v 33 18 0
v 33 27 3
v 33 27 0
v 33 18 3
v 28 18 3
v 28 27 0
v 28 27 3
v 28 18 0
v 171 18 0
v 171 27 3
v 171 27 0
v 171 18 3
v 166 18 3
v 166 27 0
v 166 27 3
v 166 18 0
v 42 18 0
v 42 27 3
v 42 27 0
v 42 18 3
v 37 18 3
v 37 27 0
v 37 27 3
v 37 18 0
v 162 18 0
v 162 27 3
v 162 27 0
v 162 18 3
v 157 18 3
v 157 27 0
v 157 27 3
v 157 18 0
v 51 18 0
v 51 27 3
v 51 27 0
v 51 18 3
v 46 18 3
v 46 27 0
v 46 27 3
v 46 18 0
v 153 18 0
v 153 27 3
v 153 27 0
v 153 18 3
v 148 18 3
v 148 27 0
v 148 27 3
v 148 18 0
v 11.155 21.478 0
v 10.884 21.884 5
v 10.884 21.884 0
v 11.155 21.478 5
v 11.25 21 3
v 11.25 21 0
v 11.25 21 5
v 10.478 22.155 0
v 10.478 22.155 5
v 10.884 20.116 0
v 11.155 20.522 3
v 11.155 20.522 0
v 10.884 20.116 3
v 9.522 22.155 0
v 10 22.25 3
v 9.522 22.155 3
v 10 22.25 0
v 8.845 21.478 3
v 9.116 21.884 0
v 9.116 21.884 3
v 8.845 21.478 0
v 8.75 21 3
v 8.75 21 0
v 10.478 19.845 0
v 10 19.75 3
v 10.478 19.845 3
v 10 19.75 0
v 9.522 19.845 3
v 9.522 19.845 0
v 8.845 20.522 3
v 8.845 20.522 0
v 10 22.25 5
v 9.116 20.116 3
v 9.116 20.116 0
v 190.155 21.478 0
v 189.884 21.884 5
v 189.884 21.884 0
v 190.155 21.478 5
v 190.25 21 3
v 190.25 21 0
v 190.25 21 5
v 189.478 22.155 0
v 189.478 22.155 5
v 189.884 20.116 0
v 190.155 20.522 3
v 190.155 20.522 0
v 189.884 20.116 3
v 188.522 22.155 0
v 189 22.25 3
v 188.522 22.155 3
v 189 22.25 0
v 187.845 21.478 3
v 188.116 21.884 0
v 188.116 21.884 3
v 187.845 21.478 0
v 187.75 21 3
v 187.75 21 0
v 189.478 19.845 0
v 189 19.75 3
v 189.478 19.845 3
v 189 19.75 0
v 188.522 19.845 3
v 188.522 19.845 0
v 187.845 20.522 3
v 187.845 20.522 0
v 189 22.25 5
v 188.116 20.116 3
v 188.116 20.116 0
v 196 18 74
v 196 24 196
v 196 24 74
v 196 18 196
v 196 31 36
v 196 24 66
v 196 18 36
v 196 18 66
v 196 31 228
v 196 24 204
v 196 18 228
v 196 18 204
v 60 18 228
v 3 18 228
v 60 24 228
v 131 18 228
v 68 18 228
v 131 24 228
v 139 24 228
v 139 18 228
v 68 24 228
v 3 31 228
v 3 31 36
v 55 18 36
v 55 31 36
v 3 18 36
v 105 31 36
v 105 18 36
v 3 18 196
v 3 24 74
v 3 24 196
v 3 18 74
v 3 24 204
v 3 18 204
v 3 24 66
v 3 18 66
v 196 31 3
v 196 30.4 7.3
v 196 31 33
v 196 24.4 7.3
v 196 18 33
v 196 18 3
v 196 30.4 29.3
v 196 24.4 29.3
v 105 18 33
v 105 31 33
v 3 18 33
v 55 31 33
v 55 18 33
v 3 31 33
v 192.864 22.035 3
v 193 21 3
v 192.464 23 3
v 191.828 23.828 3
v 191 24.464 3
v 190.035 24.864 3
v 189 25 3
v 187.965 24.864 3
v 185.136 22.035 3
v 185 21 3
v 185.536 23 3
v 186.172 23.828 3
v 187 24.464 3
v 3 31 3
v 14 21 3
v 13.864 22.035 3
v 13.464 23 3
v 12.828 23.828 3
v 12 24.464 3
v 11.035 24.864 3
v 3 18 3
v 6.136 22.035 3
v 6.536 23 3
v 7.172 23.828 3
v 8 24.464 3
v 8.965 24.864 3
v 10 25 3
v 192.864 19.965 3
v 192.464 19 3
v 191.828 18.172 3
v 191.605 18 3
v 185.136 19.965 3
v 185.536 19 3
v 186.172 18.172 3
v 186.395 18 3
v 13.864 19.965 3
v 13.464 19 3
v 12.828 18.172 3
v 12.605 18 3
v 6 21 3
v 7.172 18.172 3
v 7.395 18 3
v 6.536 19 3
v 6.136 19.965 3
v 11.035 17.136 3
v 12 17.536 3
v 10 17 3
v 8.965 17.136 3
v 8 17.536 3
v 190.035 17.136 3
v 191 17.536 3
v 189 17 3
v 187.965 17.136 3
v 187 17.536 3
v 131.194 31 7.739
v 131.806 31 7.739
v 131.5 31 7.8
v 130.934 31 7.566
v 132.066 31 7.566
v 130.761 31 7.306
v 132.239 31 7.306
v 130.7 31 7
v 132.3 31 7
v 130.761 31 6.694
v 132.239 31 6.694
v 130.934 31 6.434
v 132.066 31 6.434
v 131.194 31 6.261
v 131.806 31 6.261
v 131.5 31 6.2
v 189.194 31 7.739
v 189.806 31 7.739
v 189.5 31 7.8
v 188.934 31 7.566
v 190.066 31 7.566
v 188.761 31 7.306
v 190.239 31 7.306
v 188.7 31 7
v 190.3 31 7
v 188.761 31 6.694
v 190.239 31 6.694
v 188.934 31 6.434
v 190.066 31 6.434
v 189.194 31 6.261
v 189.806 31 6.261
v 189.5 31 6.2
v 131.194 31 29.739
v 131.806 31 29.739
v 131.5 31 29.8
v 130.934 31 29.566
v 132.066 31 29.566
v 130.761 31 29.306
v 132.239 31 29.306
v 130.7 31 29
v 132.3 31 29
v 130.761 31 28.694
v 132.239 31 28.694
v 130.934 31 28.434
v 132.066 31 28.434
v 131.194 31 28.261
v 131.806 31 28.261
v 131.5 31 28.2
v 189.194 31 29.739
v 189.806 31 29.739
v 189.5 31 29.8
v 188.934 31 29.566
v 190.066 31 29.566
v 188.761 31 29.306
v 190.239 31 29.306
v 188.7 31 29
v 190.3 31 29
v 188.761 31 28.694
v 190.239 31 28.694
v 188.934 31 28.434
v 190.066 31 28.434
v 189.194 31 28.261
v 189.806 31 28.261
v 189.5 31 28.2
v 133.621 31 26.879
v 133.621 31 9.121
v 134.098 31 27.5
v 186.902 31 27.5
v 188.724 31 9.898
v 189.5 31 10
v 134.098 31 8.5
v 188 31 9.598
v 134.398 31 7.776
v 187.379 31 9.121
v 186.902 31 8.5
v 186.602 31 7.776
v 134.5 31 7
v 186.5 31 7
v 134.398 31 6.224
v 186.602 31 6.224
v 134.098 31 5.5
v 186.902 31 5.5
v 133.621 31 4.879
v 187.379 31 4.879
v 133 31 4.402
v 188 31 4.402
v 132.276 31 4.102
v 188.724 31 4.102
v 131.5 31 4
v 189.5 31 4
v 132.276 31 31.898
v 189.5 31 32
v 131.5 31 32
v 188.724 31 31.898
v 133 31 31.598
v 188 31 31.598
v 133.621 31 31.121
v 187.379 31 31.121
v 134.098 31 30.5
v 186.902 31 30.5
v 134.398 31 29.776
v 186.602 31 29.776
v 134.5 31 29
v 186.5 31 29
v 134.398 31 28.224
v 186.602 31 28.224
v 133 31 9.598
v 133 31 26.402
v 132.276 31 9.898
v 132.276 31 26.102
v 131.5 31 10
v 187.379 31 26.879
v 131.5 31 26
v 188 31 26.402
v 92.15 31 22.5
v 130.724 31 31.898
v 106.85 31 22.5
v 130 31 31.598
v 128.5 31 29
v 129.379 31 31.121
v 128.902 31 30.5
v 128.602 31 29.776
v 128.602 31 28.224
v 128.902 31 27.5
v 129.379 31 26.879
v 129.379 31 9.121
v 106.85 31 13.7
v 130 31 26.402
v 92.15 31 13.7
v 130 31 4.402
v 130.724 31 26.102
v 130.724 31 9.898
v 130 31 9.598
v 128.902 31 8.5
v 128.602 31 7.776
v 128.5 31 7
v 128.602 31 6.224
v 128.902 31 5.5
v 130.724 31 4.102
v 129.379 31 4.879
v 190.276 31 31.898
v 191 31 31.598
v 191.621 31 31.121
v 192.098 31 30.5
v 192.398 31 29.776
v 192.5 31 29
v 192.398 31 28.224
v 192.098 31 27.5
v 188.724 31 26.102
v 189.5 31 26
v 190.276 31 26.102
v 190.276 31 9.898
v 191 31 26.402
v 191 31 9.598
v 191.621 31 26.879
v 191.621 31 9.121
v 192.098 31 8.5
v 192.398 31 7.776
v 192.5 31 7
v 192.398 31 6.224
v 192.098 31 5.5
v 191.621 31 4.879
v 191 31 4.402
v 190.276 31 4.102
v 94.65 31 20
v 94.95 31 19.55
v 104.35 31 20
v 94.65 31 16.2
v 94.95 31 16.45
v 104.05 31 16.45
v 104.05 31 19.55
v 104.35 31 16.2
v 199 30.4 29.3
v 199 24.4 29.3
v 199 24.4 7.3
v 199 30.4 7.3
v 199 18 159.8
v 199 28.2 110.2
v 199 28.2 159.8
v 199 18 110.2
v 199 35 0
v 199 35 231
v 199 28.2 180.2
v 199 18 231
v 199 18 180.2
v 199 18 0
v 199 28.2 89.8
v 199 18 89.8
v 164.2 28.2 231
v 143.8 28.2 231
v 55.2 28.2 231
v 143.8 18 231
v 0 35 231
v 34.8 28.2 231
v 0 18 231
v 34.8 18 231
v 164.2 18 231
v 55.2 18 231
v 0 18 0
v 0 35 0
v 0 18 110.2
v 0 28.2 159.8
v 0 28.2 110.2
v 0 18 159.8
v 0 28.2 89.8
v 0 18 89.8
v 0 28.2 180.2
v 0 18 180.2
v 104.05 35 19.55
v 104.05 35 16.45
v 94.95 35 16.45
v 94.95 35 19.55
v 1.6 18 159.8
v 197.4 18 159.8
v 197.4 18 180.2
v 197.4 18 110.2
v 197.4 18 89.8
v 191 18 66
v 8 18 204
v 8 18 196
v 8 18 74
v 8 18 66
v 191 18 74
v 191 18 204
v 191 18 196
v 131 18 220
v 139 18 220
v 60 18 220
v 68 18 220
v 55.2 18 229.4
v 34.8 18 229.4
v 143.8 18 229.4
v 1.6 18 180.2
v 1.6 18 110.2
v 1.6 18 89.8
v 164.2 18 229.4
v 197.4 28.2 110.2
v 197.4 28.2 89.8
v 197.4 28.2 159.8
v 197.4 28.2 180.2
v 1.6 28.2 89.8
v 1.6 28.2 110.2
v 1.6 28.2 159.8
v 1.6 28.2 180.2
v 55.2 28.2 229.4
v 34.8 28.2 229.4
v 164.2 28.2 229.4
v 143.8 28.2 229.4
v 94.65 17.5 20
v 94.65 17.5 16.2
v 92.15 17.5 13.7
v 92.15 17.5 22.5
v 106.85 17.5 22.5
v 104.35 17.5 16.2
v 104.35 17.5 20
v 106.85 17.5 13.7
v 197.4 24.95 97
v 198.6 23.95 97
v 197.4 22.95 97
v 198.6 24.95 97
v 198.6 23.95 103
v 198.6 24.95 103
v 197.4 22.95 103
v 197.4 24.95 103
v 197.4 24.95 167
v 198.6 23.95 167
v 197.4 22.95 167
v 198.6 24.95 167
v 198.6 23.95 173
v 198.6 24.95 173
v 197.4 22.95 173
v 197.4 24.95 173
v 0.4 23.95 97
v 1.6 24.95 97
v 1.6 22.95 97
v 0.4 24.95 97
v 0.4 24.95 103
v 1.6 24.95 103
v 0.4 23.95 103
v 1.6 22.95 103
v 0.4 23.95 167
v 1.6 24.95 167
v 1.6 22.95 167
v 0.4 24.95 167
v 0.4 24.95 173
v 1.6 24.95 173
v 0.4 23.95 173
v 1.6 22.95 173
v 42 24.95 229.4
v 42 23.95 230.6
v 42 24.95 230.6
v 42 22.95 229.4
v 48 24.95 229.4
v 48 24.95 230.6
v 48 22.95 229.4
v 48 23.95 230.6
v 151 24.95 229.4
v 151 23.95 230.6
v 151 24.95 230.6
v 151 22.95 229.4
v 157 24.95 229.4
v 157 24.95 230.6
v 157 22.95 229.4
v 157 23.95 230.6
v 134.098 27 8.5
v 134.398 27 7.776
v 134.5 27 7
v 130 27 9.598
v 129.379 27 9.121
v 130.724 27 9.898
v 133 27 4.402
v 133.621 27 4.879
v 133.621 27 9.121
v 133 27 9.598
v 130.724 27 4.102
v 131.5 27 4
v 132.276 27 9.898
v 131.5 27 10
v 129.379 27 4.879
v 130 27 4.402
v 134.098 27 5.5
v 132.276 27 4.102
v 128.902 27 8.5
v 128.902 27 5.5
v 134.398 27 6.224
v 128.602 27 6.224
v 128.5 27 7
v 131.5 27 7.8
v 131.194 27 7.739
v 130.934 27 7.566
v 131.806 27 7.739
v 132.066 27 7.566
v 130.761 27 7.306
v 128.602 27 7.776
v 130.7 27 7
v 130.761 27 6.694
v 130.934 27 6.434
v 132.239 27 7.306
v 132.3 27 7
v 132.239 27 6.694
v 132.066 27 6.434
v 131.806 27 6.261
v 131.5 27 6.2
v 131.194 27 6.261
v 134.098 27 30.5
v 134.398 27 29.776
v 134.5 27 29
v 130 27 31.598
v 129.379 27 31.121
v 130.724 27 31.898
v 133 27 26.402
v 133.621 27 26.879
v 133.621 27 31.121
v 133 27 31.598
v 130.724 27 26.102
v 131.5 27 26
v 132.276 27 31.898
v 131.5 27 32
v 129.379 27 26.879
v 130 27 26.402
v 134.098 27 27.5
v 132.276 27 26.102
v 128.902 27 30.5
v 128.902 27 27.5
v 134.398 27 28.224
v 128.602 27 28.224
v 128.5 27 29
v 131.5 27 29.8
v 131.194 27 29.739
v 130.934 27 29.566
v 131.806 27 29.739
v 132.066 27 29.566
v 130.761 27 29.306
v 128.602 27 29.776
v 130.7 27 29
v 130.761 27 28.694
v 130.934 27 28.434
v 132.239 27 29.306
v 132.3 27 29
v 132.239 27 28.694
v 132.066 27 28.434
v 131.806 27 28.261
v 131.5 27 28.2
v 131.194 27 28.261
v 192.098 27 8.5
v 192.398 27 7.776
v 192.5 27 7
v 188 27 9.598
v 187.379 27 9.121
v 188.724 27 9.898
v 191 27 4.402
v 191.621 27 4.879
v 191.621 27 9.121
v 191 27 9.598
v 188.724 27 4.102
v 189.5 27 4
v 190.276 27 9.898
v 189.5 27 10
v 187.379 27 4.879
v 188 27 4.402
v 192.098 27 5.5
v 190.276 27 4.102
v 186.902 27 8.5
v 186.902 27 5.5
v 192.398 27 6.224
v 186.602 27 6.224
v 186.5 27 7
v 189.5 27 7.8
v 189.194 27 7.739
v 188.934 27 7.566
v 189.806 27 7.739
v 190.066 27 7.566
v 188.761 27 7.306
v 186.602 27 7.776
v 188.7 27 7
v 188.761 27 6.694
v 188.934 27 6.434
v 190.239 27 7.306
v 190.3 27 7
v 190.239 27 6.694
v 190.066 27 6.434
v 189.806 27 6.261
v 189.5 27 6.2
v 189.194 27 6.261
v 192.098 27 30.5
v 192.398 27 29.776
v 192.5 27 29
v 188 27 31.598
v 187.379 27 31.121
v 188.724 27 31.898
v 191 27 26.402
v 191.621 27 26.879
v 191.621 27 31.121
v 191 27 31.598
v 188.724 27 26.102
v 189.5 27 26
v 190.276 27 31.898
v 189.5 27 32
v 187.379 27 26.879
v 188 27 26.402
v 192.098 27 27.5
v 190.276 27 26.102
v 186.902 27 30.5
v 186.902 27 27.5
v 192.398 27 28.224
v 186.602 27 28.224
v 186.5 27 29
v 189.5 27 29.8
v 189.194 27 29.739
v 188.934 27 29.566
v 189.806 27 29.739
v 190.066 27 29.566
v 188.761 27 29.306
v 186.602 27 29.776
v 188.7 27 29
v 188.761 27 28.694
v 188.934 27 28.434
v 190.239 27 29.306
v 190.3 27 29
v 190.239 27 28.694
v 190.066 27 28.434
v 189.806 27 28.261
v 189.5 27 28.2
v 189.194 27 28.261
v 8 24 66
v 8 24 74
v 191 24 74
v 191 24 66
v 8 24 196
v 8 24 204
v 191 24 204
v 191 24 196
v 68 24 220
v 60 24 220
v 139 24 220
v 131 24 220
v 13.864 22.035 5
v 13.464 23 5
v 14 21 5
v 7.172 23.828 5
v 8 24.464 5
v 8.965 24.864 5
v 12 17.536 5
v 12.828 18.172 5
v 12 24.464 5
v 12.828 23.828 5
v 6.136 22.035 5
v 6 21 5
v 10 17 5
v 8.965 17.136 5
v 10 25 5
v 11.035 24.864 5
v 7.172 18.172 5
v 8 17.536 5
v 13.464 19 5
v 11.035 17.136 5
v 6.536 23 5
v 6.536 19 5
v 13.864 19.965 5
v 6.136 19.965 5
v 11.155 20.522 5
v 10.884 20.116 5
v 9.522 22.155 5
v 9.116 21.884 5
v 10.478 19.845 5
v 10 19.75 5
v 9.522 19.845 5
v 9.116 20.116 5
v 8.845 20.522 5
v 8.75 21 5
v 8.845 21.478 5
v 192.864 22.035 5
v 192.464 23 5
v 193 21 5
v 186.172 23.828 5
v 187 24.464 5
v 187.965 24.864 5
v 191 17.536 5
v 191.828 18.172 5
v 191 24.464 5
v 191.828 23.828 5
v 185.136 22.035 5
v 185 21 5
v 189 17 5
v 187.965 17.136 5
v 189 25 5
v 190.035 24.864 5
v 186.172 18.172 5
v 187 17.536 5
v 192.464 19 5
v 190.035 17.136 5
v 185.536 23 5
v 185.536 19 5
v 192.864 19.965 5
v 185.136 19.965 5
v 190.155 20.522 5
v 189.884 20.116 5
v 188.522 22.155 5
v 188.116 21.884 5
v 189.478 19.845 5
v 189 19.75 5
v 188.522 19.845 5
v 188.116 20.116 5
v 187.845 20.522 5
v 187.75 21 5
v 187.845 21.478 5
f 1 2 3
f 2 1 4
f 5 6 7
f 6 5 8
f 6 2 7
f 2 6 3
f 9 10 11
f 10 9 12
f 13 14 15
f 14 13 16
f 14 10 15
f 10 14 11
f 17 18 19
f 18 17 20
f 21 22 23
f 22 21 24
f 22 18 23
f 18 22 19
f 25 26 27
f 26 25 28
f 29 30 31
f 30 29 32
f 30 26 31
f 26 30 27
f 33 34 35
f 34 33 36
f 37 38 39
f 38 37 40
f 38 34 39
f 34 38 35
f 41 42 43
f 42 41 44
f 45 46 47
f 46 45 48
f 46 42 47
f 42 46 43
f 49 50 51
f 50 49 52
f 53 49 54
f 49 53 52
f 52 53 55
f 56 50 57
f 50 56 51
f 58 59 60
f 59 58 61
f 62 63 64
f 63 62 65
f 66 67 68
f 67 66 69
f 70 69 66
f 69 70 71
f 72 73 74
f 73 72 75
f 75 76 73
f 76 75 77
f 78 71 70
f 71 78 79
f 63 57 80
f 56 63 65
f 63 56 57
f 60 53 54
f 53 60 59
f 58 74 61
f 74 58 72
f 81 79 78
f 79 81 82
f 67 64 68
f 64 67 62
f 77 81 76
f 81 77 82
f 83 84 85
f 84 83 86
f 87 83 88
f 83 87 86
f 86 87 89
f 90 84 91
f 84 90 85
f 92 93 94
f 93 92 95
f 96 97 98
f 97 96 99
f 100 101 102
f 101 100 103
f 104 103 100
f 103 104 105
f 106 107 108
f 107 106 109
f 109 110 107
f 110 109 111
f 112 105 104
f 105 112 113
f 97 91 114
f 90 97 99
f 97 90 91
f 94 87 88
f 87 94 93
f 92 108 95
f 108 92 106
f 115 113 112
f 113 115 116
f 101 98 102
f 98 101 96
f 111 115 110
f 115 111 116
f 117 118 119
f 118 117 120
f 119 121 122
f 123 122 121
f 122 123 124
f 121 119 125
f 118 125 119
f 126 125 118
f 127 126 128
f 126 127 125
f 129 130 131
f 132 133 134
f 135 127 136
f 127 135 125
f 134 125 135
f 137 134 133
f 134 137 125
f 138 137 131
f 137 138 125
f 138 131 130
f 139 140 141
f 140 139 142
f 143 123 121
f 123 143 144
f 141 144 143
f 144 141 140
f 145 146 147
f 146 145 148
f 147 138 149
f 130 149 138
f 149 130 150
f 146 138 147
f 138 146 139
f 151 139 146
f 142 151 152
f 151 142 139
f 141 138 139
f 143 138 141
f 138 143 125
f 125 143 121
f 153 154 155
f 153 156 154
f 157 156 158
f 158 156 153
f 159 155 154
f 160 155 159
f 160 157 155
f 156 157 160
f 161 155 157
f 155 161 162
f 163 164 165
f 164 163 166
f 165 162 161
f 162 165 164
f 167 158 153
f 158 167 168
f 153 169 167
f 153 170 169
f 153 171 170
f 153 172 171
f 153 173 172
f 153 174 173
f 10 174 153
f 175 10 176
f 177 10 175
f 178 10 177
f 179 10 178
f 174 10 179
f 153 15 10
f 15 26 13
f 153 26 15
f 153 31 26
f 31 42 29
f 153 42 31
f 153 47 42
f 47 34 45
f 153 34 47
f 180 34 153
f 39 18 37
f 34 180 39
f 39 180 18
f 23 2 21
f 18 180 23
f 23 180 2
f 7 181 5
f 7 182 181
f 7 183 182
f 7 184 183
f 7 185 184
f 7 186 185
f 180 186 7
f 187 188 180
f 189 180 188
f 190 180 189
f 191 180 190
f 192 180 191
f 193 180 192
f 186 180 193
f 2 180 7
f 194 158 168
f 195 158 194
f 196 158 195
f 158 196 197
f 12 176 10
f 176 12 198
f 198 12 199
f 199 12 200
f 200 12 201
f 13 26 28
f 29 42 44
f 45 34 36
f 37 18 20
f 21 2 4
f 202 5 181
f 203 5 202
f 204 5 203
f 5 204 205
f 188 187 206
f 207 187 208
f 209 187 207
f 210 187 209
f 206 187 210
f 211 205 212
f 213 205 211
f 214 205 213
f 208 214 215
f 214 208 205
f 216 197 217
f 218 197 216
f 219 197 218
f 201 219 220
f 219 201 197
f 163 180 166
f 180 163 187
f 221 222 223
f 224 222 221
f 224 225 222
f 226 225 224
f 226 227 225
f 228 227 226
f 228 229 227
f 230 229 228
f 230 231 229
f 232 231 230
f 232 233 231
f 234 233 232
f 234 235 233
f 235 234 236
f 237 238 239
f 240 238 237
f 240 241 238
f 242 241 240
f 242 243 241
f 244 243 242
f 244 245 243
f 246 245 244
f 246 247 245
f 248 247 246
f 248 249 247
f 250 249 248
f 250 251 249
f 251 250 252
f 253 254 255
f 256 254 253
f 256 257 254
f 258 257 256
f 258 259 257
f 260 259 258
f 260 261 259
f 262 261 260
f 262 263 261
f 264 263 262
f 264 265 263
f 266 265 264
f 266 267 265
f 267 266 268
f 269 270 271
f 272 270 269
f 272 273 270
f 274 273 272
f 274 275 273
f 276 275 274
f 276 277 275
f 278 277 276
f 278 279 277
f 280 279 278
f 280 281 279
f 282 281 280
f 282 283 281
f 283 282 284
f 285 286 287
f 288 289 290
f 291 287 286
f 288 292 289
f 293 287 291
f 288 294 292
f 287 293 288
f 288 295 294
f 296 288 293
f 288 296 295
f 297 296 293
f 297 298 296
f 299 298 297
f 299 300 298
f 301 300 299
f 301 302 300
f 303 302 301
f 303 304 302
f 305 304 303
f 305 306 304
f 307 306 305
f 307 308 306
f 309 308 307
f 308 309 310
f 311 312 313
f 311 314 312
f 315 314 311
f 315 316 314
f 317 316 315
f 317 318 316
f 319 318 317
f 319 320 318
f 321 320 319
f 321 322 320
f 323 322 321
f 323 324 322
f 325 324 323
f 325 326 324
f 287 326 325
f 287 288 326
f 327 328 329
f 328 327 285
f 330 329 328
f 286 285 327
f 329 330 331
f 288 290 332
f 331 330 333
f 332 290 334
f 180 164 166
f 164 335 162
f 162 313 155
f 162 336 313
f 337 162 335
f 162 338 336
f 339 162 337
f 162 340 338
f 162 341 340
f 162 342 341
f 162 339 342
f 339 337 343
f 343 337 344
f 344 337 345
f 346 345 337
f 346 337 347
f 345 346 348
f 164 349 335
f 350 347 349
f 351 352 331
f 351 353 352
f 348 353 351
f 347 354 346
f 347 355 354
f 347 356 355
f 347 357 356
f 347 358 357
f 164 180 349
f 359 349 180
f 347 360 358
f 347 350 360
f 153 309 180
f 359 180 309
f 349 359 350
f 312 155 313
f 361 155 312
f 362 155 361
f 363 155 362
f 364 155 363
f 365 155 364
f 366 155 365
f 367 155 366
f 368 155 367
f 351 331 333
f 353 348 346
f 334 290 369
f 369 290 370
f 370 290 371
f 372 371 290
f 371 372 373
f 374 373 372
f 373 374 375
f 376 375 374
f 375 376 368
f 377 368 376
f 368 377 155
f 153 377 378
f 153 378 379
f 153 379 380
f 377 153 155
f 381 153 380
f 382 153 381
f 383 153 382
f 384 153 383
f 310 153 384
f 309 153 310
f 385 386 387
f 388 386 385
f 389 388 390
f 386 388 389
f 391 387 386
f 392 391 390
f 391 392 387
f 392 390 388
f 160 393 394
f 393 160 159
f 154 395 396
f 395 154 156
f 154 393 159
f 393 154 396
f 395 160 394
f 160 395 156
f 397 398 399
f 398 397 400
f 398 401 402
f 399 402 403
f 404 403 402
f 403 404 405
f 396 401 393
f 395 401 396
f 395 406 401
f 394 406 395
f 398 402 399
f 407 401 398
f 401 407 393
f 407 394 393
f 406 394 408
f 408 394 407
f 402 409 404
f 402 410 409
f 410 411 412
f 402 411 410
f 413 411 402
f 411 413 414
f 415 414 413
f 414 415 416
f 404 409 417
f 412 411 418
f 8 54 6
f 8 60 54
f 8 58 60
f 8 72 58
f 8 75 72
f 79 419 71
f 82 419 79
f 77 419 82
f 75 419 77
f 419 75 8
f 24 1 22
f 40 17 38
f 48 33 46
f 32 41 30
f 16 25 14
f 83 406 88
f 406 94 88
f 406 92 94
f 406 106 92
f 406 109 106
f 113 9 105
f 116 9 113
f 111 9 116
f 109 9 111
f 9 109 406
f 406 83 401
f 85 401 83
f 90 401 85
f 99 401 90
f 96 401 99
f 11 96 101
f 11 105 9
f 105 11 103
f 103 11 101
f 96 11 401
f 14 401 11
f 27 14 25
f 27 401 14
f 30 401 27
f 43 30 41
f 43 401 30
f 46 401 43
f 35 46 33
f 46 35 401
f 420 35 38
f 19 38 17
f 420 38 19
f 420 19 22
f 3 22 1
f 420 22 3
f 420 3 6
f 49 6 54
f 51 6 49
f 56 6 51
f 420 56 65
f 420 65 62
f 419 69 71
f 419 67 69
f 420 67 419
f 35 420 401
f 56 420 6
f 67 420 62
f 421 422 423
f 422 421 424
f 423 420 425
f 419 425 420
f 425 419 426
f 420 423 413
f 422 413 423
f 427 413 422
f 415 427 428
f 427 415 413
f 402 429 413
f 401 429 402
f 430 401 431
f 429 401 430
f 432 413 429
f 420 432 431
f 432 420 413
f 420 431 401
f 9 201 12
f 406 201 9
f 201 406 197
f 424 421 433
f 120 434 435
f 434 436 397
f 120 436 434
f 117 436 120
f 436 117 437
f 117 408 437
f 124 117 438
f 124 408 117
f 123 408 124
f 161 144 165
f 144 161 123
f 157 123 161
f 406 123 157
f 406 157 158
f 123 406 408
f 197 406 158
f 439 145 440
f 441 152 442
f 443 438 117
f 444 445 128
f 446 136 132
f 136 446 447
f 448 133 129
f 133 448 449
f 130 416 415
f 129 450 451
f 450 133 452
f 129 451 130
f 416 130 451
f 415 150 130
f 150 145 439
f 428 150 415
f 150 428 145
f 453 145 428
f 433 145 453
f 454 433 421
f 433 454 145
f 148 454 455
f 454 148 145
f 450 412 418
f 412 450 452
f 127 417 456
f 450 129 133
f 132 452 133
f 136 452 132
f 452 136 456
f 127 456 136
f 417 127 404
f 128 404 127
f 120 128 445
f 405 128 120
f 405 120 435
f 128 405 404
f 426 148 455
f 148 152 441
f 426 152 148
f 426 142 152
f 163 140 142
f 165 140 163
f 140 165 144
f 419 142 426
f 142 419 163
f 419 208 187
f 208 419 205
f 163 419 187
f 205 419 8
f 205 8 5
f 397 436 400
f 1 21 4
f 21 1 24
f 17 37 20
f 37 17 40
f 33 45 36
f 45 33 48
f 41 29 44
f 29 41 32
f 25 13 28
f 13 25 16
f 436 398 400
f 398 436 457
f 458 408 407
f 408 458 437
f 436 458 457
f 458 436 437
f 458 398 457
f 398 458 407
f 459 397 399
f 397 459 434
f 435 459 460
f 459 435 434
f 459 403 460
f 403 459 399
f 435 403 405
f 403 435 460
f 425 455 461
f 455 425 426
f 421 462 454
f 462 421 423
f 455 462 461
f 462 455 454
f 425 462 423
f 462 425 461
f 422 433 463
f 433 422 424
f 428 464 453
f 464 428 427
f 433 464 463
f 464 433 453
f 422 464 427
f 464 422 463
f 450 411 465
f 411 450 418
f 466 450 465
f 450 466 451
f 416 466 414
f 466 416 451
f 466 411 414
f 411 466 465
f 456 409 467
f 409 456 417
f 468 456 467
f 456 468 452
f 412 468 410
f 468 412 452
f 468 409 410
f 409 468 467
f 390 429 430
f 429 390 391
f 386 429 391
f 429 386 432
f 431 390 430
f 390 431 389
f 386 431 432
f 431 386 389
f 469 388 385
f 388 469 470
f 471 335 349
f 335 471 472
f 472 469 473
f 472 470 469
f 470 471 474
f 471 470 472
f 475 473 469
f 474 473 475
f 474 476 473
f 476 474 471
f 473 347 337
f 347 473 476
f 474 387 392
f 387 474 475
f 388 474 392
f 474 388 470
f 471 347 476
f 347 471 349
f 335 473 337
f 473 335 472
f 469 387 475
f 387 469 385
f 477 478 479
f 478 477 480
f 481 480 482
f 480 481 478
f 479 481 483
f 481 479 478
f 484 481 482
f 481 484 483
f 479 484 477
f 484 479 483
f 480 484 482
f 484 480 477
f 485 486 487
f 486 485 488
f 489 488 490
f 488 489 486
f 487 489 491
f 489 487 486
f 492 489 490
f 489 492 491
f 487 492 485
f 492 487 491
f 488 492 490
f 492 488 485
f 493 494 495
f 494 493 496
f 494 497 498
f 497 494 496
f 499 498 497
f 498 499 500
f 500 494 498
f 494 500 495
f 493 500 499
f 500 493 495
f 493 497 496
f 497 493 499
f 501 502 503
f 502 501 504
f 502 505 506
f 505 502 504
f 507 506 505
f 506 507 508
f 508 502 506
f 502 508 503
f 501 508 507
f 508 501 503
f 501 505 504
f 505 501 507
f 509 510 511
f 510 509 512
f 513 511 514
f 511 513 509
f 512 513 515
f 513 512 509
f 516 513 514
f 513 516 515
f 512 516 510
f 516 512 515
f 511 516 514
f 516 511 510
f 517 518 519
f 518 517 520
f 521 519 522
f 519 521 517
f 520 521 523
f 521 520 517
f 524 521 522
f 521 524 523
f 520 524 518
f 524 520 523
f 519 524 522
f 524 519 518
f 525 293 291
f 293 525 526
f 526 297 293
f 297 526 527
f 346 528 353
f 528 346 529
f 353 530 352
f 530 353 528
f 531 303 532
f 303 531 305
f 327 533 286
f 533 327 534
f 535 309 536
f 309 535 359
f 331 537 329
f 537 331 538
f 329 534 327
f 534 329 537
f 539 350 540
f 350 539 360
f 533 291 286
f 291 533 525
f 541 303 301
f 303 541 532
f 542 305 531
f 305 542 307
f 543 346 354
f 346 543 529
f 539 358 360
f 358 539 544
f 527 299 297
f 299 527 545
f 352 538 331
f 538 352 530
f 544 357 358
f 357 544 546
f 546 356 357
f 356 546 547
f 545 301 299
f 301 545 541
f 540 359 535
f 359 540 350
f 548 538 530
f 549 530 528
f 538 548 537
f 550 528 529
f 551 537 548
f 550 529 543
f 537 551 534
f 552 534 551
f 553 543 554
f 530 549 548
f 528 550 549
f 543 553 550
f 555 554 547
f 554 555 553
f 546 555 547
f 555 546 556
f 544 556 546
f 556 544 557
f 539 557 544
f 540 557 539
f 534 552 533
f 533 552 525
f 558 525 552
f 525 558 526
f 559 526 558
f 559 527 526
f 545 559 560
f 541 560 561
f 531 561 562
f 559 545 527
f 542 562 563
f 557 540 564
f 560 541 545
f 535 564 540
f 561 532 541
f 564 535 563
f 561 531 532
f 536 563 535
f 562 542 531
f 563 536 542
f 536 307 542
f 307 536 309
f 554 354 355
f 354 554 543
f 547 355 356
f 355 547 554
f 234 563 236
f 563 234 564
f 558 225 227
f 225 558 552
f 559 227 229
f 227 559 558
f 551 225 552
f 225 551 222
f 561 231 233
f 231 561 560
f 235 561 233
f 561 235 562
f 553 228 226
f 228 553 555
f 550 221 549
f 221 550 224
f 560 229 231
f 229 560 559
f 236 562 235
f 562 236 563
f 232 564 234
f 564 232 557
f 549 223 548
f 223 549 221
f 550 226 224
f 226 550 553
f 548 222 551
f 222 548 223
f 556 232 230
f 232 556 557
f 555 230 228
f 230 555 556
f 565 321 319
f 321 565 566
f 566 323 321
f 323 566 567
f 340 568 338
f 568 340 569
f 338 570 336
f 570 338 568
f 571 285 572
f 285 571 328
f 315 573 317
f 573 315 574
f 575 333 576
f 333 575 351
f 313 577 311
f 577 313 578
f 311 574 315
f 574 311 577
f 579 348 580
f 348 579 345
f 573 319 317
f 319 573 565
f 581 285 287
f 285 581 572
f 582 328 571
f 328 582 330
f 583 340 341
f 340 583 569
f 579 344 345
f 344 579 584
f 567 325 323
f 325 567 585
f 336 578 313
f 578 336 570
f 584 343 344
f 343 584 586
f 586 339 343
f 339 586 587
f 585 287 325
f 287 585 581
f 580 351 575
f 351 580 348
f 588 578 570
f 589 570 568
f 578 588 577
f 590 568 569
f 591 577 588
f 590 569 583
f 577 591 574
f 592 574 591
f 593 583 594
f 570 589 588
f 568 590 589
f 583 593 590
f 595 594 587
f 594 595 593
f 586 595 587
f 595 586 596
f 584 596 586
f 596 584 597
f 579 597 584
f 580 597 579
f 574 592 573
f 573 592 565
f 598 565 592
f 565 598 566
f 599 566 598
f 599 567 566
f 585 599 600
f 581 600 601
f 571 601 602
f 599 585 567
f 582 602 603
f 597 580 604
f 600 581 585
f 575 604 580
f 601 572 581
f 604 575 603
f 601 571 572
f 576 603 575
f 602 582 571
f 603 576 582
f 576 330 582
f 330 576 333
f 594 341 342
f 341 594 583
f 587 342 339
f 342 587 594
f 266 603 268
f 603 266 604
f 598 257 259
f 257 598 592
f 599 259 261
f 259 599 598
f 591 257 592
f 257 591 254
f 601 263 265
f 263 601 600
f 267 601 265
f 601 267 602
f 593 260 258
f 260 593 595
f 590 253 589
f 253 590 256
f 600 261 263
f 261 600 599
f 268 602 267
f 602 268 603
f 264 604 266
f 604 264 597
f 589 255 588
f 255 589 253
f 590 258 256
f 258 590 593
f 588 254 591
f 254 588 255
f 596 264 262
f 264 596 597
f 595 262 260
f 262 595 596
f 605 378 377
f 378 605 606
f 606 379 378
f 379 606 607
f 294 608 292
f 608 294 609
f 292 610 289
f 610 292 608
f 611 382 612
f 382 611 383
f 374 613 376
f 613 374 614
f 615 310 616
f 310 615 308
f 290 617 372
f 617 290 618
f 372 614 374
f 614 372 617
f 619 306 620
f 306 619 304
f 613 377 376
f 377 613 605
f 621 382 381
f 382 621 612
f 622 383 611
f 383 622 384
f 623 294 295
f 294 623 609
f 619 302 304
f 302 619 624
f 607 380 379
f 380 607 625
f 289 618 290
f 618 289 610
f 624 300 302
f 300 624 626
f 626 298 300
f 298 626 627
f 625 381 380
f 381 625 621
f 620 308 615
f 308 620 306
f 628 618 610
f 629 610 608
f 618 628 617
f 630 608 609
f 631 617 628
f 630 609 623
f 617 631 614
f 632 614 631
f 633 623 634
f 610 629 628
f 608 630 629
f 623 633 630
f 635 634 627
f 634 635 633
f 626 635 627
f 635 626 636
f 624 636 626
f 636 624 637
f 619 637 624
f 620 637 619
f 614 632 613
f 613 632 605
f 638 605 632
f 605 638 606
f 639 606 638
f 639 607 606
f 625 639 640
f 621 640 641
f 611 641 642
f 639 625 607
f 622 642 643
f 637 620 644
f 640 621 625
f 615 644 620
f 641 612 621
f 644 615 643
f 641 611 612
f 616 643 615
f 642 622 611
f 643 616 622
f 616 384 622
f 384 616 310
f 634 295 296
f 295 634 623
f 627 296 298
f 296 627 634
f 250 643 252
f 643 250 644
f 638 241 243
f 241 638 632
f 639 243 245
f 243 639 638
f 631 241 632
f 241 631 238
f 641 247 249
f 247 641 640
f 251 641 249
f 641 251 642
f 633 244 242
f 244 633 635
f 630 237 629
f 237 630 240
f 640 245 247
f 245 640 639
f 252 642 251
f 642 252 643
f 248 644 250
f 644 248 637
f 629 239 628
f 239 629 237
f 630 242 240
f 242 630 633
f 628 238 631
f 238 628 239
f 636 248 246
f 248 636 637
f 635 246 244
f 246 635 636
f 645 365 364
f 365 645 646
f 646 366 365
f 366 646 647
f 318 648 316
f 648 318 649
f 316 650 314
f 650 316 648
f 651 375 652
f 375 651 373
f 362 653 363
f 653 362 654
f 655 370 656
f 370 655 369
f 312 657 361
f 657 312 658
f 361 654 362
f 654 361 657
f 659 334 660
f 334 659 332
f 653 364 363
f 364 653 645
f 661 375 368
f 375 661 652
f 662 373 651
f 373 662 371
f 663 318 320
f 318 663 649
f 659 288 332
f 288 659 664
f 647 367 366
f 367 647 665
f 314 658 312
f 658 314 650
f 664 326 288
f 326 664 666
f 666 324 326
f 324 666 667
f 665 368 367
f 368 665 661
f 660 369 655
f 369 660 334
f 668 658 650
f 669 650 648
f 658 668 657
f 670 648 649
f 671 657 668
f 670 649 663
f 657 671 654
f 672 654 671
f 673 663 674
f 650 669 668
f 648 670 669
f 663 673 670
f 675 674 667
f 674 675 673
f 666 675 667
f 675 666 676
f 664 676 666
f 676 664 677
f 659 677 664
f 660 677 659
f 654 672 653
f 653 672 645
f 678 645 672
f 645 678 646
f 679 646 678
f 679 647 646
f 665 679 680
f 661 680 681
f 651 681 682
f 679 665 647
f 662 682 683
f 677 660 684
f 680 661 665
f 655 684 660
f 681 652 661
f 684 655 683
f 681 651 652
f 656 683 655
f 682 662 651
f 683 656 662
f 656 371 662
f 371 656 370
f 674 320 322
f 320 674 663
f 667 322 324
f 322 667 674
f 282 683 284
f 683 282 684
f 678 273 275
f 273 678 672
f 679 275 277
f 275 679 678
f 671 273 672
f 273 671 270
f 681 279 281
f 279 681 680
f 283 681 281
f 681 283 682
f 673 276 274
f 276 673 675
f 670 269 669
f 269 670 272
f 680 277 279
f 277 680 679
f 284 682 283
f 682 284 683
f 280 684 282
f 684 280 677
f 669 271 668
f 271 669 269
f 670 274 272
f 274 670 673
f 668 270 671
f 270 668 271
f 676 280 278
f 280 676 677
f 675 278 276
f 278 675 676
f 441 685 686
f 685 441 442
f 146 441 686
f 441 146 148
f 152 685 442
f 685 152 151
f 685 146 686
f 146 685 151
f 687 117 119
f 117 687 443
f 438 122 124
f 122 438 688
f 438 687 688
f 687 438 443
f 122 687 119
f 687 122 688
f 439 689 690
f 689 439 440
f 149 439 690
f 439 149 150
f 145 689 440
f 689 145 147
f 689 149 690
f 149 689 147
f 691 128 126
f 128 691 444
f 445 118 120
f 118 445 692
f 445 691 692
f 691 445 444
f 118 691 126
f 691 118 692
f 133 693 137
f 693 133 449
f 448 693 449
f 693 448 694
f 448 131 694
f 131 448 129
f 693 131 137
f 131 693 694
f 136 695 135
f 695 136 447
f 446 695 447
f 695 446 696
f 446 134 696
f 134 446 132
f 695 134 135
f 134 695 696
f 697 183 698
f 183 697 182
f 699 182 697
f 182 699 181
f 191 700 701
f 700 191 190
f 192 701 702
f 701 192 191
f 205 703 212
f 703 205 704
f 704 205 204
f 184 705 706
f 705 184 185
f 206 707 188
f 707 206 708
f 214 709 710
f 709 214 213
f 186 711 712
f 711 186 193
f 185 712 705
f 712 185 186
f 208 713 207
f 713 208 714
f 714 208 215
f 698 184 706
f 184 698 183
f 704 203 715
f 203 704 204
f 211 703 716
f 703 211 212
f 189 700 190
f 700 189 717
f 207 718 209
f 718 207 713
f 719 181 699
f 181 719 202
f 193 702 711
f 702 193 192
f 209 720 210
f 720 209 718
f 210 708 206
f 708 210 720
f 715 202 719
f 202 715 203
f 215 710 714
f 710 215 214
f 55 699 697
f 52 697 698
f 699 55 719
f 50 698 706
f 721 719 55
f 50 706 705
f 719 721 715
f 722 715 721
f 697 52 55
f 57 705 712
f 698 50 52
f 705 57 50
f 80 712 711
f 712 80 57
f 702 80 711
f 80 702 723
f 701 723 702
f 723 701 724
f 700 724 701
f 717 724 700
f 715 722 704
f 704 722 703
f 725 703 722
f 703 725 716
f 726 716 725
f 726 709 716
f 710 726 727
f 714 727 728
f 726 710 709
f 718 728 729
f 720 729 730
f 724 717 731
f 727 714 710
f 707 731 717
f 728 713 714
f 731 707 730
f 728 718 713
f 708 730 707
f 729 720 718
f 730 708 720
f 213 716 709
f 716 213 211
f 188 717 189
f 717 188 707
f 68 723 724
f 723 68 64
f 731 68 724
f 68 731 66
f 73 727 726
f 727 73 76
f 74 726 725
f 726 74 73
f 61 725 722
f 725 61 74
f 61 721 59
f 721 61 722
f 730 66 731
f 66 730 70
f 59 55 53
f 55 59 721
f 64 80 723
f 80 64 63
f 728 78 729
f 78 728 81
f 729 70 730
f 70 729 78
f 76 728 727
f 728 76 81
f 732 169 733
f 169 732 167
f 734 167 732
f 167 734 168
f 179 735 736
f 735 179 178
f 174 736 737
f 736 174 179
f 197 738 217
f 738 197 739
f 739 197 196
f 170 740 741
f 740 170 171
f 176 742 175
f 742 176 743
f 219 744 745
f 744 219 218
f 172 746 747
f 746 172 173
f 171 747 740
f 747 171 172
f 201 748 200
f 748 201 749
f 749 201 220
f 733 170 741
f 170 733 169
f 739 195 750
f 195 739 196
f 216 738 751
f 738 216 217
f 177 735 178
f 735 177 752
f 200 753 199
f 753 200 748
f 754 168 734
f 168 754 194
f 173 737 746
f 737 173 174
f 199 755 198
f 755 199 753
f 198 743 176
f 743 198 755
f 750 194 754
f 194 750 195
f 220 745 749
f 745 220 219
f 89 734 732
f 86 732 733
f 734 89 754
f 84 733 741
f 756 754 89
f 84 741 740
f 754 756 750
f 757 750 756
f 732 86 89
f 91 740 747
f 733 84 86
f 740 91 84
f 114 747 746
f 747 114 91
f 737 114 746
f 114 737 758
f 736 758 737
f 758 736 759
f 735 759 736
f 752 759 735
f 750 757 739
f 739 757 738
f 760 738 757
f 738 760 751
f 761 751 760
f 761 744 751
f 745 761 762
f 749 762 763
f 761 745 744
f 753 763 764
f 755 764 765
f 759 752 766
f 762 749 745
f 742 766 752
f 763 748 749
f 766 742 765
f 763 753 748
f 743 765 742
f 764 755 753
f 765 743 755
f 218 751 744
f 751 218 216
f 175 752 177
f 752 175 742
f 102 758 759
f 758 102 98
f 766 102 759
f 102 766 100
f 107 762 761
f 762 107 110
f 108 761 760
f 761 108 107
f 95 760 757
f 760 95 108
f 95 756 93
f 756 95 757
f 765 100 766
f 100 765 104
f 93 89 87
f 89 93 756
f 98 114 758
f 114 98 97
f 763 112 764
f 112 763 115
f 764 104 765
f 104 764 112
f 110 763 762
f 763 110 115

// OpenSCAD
// ═══════════════════════════════════════════════════════════════════
//  LED MATRIX ENCLOSURE — v3: minimal bezel + snap-fit clips
//
//  Matrix : SeenGreat RGB P3.0 64×64 — 192 × 192 × 15 mm, HUB75, 5V/4A
//           Pixels span the full 192 mm (64 × 3 mm), outer LEDs sit
//           ~0.5 mm from the PCB edge → bezel lip is only 0.5 mm.
//  MCU    : ESP32-S3 DevKit — flat against back panel, lower right,
//           4 standoffs (58 × 22 mm hole pitch). USB-C out right wall.
//  Power  : USB-C female breakout — back panel, centred.
//  Joint  : NO screws — 6 cantilever snap clips (2 top, 2 per side).
//           Bottom is tied by the foot-rail screws.
//  Process: FDM, 0.4 mm nozzle, 3 perimeters. PETG preferred (clips
//           flex); PLA works but snap gently.
//
//  ── Parts ─────────────────────────────────────────────────────────
//   front_piece — face down on plate (bezel lip prints on the bed).
//   back_piece  — back face down. Retention tabs + hooks may want
//                 thin support (small cantilevers).
//   foot_rail   — ×2, no support. Mirror one in slicer.
//
//  ── Assembly ──────────────────────────────────────────────────────
//   1. Slide matrix into front piece from behind (0.5 mm lip stops it).
//   2. ESP32 onto back-piece standoffs (4× BT2×6 thread-forming).
//      USB-C breakout slides into its tray in front of the cutout.
//   3. Route HUB75 + power wires through the shelf cable slot.
//   4. Press back piece on until all 6 clips click. Retention tabs
//      press the matrix against the lip.
//      (To open: press a flat tool into each window, lift the hook.)
//   5. Feet from below: 4× M3×30 into the floor pads, heads hidden
//      in the rubber recesses.
//
//  ── BOM ───────────────────────────────────────────────────────────
//   4× M3×30 socket-cap — feet     4× BT2×6 thread-forming — ESP32
//   2× rubber strips ~14×29 mm — foot recesses
// ═══════════════════════════════════════════════════════════════════

/* [Matrix] */
MTX_W   = 192;
MTX_D   = 15;
MTX_TOL = 0.5;

/* [Walls] */
WALL      = 3;
BACK_W    = 4;
FRONT_LIP = 0.5;   // bezel overlap — LEDs start ~0.5 mm from PCB edge!

/* [Internal zones] */
WIRE_GAP = 13;
BASE_H   = 30;

/* [Power USB-C breakout — back panel, centred] */
PWR_USBC_W = 9.1;
PWR_USBC_H = 3.1;
// Breakout board tray — MEASURE YOUR BOARD and set these three:
PWR_PCB_W   = 9.2;    // board width
PWR_PCB_L   = 16;    // board length (connector edge to front edge)
PWR_PCB_T   = 1.6;   // board thickness
PWR_SHELL_H = 2.6;   // USB-C receptacle shell height (sits on PCB top)
PWR_RELIEF  = 2.5;   // recess into back wall so the plug seats fully
PWR_CLR     = 0.25;  // side clearance in the tray channel
TRAY_RAIL_W  = 2.5;  // C-rail wall thickness
TRAY_LIP     = 0;  // rail lip overhang onto the PCB top
TRAY_FLOOR_T = 2.5;  // tray floor thickness

/* [ESP32-S3 DevKit — flat against back panel, lower right] */
ESP_W            = 69;
ESP_D            = 25.4;
ESP_PCB_T        = 1.6;
ESP_X_MARGIN     = 1;
ESP_Z_MARGIN     = 2.3;
ESP_HOLE_X_PITCH = 58;     // measured
ESP_HOLE_Z_PITCH = 22;     // measured
STOFF_H          = 4;
STOFF_OD         = 6;
STOFF_ID         = 1.6;    // BT2×6 thread-forming pilot (~0.8 × ⌀2)

/* [ESP32 USB-C slot — right side wall] */
ESP_USBC_LEN     = 22;
ESP_USBC_DEPTH   = 6;
ESP_USBC_Z_INSET = 2;

/* [Snap clips — 2 top, 2 per side] */
CLIP_L      = 20;    // lip length along the wall
CLIP_LIP_T  = 1.4;   // lip thickness (outer part of the 3 mm wall)
CLIP_LIP_D  = 10;    // how far the lip reaches past the split
CLIP_WIN_W  = 7;     // window width (along wall)
CLIP_WIN_H  = 2.5;   // window height (in Y)
CLIP_HOOK_W = 6;     // hook width
CLIP_HOOK_T = 1.2;   // hook proudness off the recessed wall
CLIP_Y      = 6;     // window/hook centre distance behind the split
CLIP_CLEAR  = 0.2;   // fit clearance (increase if snap is too tight)

/* [Cable slot through shelf] */
CABLE_X0 = 55;
CABLE_W  = 50;
CABLE_D  = 18;

/* [Feet — 2 side rails, screwed from below] */
FOOT_W  = 20;
FOOT_H  = 25;
FOOT_HY = [10, 21];
PAD_OD  = 8;
PAD_H   = 2;

/* [Hardware] */
M3_TAP    = 2.5;
M3_CLEAR  = 3.4;
M3_HEAD_D = 6.5;
M3_HEAD_H = 3.0;

// ═══ DERIVED ══════════════════════════════════════════════════════
BOX_W   = MTX_W + 2*MTX_TOL + 2*WALL;            // 199
BOX_D   = WALL + MTX_D + WIRE_GAP + BACK_W;      // 35
BOX_H   = WALL + BASE_H + WALL + MTX_W + WALL;   // 231
INT_W   = MTX_W + 2*MTX_TOL;                     // 193
SHELF_Z = WALL + BASE_H;                         // 33
MTX_Z   = SHELF_Z + WALL;                        // 36
SPLIT_Y = WALL + MTX_D;                          // 18

OPEN_W = MTX_W - 2*FRONT_LIP;                    // 191
OPEN_X = (BOX_W - OPEN_W)/2;
OPEN_Z = MTX_Z + FRONT_LIP;

// ESP32
ESP_X0     = BOX_W - WALL - ESP_X_MARGIN - ESP_W;   // 126
ESP_Z0     = WALL + ESP_Z_MARGIN;                    // 5.3
ESP_BACK_Y = BOX_D - BACK_W - STOFF_H;               // 27
ESP_FACE_Y = ESP_BACK_Y - ESP_PCB_T;                 // 25.4
ESP_HX1 = ESP_X0 + (ESP_W - ESP_HOLE_X_PITCH)/2;
ESP_HX2 = ESP_HX1 + ESP_HOLE_X_PITCH;
ESP_HZ1 = ESP_Z0 + (ESP_D - ESP_HOLE_Z_PITCH)/2;
ESP_HZ2 = ESP_HZ1 + ESP_HOLE_Z_PITCH;

// Power breakout tray (board lies flat, connector poking into the
// back-wall recess; slides in from the front along +Y)
PWR_PCB_ZB = WALL + BASE_H/2 - PWR_SHELL_H/2 - PWR_PCB_T + 2;  // PCB bottom ≈ 15.1
PWR_PCB_Y1 = BOX_D - BACK_W + PWR_RELIEF;                   // rear edge  = 33.5
PWR_PCB_Y0 = PWR_PCB_Y1 - PWR_PCB_L;                        // front edge = 15.5
TRAY_Y0    = PWR_PCB_Y0;
TRAY_X0    = BOX_W/2 - PWR_PCB_W/2 - PWR_CLR - TRAY_RAIL_W;
TRAY_W     = PWR_PCB_W + 2*PWR_CLR + 2*TRAY_RAIL_W;
TRAY_TOP   = PWR_PCB_ZB + PWR_PCB_T + 0.3 + 1.4;            // rail top ≈ 18.4

// Foot screws (X = rail centres)
_FOOT_X = [FOOT_W/2, BOX_W - FOOT_W/2];              // 10, 189

// Clip frames: local (u=along wall, y=box depth, t=outward normal, 0 at
// outer surface). One multmatrix per clip.
// Side clips at z = 100 / 170 (clear of retention tabs at z 66-74 & 196-204)
// Top clips  at x = 45 / 154  (clear of top tabs   at x 60-68 & 131-139)
_CLIPS = [
    [[0,0, 1, BOX_W], [0,1,0,0], [1,0,0, 100], [0,0,0,1]],   // right wall
    [[0,0, 1, BOX_W], [0,1,0,0], [1,0,0, 170], [0,0,0,1]],
    [[0,0,-1, 0    ], [0,1,0,0], [1,0,0, 100], [0,0,0,1]],   // left wall
    [[0,0,-1, 0    ], [0,1,0,0], [1,0,0, 170], [0,0,0,1]],
    [[1,0,0, 45    ], [0,1,0,0], [0,0,1, BOX_H], [0,0,0,1]], // top wall
    [[1,0,0, 154   ], [0,1,0,0], [0,0,1, BOX_H], [0,0,0,1]]
];

// ── Design-rule checks ────────────────────────────────────────────
assert(FRONT_LIP <= 0.6,          "lip covers the outer LED row");
assert(ESP_Z0 + ESP_D <= SHELF_Z, "ESP32 taller than base zone");
assert(WALL + PAD_H <= ESP_Z0,    "floor pads hit ESP32 PCB");
assert(FOOT_HY[0] < SPLIT_Y && FOOT_HY[1] > SPLIT_Y,
       "feet must screw into BOTH halves");
assert(CLIP_LIP_T + CLIP_CLEAR < WALL, "clip recess eats whole wall");
assert(PWR_RELIEF < BACK_W,            "breakout recess breaks through wall");
assert(PWR_PCB_Y0 > SPLIT_Y - 10,      "breakout board too long for chamber");
assert(TRAY_TOP < SHELF_Z,             "tray taller than base zone");

echo(str("Box W×D×H : ", BOX_W, " × ", BOX_D, " × ", BOX_H));
echo(str("Bezel opening: ", OPEN_W, " × ", OPEN_W, " (lip ", FRONT_LIP, " mm)"));

// ═══ SNAP CLIP GEOMETRY (local frame) ═════════════════════════════
// Front piece: lip slab with a window.
module _clip_lip_add() {
    difference() {
        translate([-CLIP_L/2, SPLIT_Y, -CLIP_LIP_T])
            cube([CLIP_L, CLIP_LIP_D, CLIP_LIP_T]);
        translate([-CLIP_WIN_W/2, SPLIT_Y + CLIP_Y - CLIP_WIN_H/2, -CLIP_LIP_T - 0.1])
            cube([CLIP_WIN_W, CLIP_WIN_H, CLIP_LIP_T + 0.2]);
    }
}
// Back piece: recess cut (thins the wall to a flexing cantilever).
module _clip_recess_cut() {
    translate([-CLIP_L/2 - CLIP_CLEAR, SPLIT_Y - 0.1, -CLIP_LIP_T - CLIP_CLEAR])
        cube([CLIP_L + 2*CLIP_CLEAR, CLIP_LIP_D + CLIP_CLEAR + 0.1,
              CLIP_LIP_T + CLIP_CLEAR + 1]);
}
// Back piece: ramped hook on the recessed surface. Square face locks
// against the window's rear edge; 45°-ish ramp leads in during snap.
module _clip_hook_add() {
    y0 = SPLIT_Y + CLIP_Y - CLIP_WIN_H/2 + CLIP_CLEAR;   // front face
    t0 = -CLIP_LIP_T - CLIP_CLEAR;                        // recessed surface
    translate([-CLIP_HOOK_W/2, 0, 0])
        rotate([90, 0, 90])
            linear_extrude(CLIP_HOOK_W)
                polygon([[y0, t0], [y0 + 2, t0],
                         [y0 + 2, t0 + CLIP_HOOK_T], [y0 + 1, t0 + CLIP_HOOK_T]]);
}

// ═══ SHARED CUTOUTS ═══════════════════════════════════════════════
module _pockets() {
    translate([WALL, WALL, MTX_Z])                                   // matrix + wire gap
        cube([INT_W, MTX_D + WIRE_GAP, MTX_W]);
    translate([WALL, WALL, WALL])                                    // base chamber
        cube([INT_W, BOX_D - WALL - BACK_W, BASE_H]);
    translate([OPEN_X, -1, OPEN_Z])                                  // bezel opening
        cube([OPEN_W, WALL + 2, OPEN_W]);
    for (i = [0:2]) {                                                // vents
        translate([28 + i*9,         WALL + 5, -1])
            cube([5, BOX_D - 2*WALL - 10, WALL + 2]);
        translate([BOX_W - 33 - i*9, WALL + 5, -1])
            cube([5, BOX_D - 2*WALL - 10, WALL + 2]);
    }
    for (fx = _FOOT_X, fy = FOOT_HY)                                 // foot pilots
        translate([fx, fy, -1])
            cylinder(d=M3_TAP, h=WALL + PAD_H + 5, $fn=16);
    translate([BOX_W - WALL - 1,                                     // ESP32 USB-C slot
               ESP_FACE_Y - ESP_USBC_DEPTH + 5,
               ESP_Z0 + ESP_USBC_Z_INSET])
        cube([WALL + 2, ESP_USBC_DEPTH, ESP_USBC_LEN]);
}

module _cable_slot() {
    translate([CABLE_X0, BOX_D - BACK_W - CABLE_D, SHELF_Z - 1])
        cube([CABLE_W, CABLE_D, WALL + 2]);
}

module _floor_pad(fx, fy) {
    translate([fx, fy, WALL])
        difference() {
            cylinder(d=PAD_OD, h=PAD_H, $fn=24);
            translate([0,0,-1]) cylinder(d=M3_TAP, h=PAD_H+2, $fn=16);
        }
}

// ═══ POWER BREAKOUT MOUNT ═════════════════════════════════════════
// Recess in the back wall's inner face: the board's rear (connector
// end) nests PWR_RELIEF deep so the receptacle reaches the cutout and
// a plug can seat fully (overmold stops at the outer surface).
module _pwr_relief_cut() {
    
}
// Tray on the back piece: floor + two C-rails. Board slides in from
// the front (+Y) under the rail lips until it bottoms in the recess.
module _pwr_tray() {
    // floor
    translate([TRAY_X0, TRAY_Y0, PWR_PCB_ZB - TRAY_FLOOR_T - 0.9])
        cube([TRAY_W, BOX_D - BACK_W - TRAY_Y0, TRAY_FLOOR_T]);
    translate([TRAY_X0, TRAY_Y0, PWR_PCB_ZB + TRAY_FLOOR_T + 0.4])
        cube([TRAY_W, BOX_D - BACK_W - TRAY_Y0, TRAY_FLOOR_T]);
    // rails with lips
    for (rx = [TRAY_X0, TRAY_X0 + TRAY_W - TRAY_RAIL_W]) {
        translate([rx, TRAY_Y0, PWR_PCB_ZB - TRAY_FLOOR_T])
            cube([TRAY_RAIL_W, BOX_D - BACK_W - TRAY_Y0,
                  TRAY_TOP - PWR_PCB_ZB + TRAY_FLOOR_T]);
        lip_x = (rx == TRAY_X0) ? rx + TRAY_RAIL_W : rx - TRAY_LIP;
        translate([lip_x, TRAY_Y0, PWR_PCB_ZB + PWR_PCB_T + 0.3])
            cube([TRAY_LIP, BOX_D - BACK_W - TRAY_Y0,
                  TRAY_TOP - PWR_PCB_ZB - PWR_PCB_T - 0.3]);
    }
}
// Blocker fin on the FRONT piece: once the halves clip together it
// sits 0.4 mm in front of the board's edge — the board is captive
// with no fasteners. Open the box to slide the board out.
module _pwr_blocker() {
    translate([BOX_W/2 - 1.1, WALL, WALL])
        cube([2.2, PWR_PCB_Y0 - 0.4 - WALL, 16]);
}

// ═══ FRONT PIECE  (y = 0 … SPLIT_Y, + clip lips) ══════════════════
module front_piece() {
    intersection() {
        difference() { cube([BOX_W, BOX_D, BOX_H]); _pockets(); }
        cube([BOX_W, SPLIT_Y, BOX_H]);
    }
    difference() {                                                   // shelf, front part
        translate([WALL, WALL, SHELF_Z])
            cube([INT_W, SPLIT_Y - WALL, WALL]);
        _cable_slot();
    }
    for (m = _CLIPS) multmatrix(m) _clip_lip_add();                  // clip lips
    _pwr_blocker();                                                  // traps breakout board
    for (fx = _FOOT_X) _floor_pad(fx, FOOT_HY[0]);
}

// ═══ BACK PIECE  (y = SPLIT_Y … BOX_D) ════════════════════════════
module back_piece() {
    difference() {
        union() {
            intersection() {
                difference() { cube([BOX_W, BOX_D, BOX_H]); _pockets(); }
                translate([0, SPLIT_Y, 0])
                    cube([BOX_W, BOX_D - SPLIT_Y, BOX_H]);
            }
            difference() {                                           // shelf, rear part
                translate([WALL, SPLIT_Y, SHELF_Z])
                    cube([INT_W, BOX_D - BACK_W - SPLIT_Y, WALL]);
                _cable_slot();
            }
        }
        translate([BOX_W/2 - PWR_USBC_W/2, BOX_D - BACK_W - 1,       // power USB-C
                   WALL + BASE_H/2 - PWR_USBC_H/2])
            cube([PWR_USBC_W, BACK_W + 2, PWR_USBC_H]);
        _pwr_relief_cut();                                           // breakout nesting recess
        for (m = _CLIPS) multmatrix(m) _clip_recess_cut();           // clip recesses
    }

    _pwr_tray();                                                     // breakout board tray

    for (m = _CLIPS) multmatrix(m) _clip_hook_add();                 // clip hooks

    for (cx = [ESP_HX1, ESP_HX2], cz = [ESP_HZ1, ESP_HZ2])           // ESP32 standoffs
        translate([cx, BOX_D - BACK_W, cz])
            rotate([90, 0, 0])
                difference() {
                    cylinder(d=STOFF_OD, h=STOFF_H, $fn=24);
                    translate([0,0,-2]) cylinder(d=STOFF_ID, h=STOFF_H+3, $fn=16);
                }

    _TAB = 5; _TABL = 6; _TABH = 8;                                  // retention tabs
    for (tz = [MTX_Z + 30, MTX_Z + 160]) {
        translate([WALL, SPLIT_Y, tz])              cube([_TAB, _TABL, _TABH]);
        translate([BOX_W - WALL - _TAB, SPLIT_Y, tz]) cube([_TAB, _TABL, _TABH]);
    }
    for (tx = [60, BOX_W - 68])
        translate([tx, SPLIT_Y, BOX_H - WALL - _TABH])
            cube([_TABH, _TABL, _TABH]);

    for (fx = _FOOT_X) _floor_pad(fx, FOOT_HY[1]);
}

// ═══ FOOT RAIL  (×2 — mirror one in slicer) ═══════════════════════
module foot_rail() {
    INSET = 3; RDEPTH = 3;
    difference() {
        hull()
            for (x = [3, FOOT_W-3], y = [3, BOX_D-3])
                translate([x, y, 0]) cylinder(r=3, h=FOOT_H, $fn=24);
        translate([INSET, INSET, -1])
            cube([FOOT_W - 2*INSET, BOX_D - 2*INSET, RDEPTH + 1]);
        for (fy = FOOT_HY) translate([FOOT_W/2, fy, 0]) {
            translate([0,0,-1]) cylinder(d=M3_CLEAR, h=FOOT_H+2, $fn=20);
            translate([0,0,RDEPTH-0.1])
                cylinder(d=M3_HEAD_D, h=M3_HEAD_H+0.1, $fn=24);
        }
    }
}

// ═══ RENDER ═══════════════════════════════════════════════════════
PART          = "back";   // "front" | "back" | "foot" | "assembly"
CROSS_SECTION = false;

module _render() {
    if (PART == "front") color("LightSteelBlue") front_piece();
    else if (PART == "back")  color("SlateGray") back_piece();
    else if (PART == "foot")  color("SteelBlue") foot_rail();
    else {
        color("LightSteelBlue", 0.9) front_piece();
        color("SlateGray", 0.9)      back_piece();
        color("SteelBlue", 0.9) {
            translate([0, 0, -FOOT_H]) foot_rail();
            translate([BOX_W, 0, -FOOT_H]) mirror([1,0,0]) foot_rail();
        }
    }
}

if (CROSS_SECTION)
    intersection() { _render(); cube([BOX_W, BOX_D/2, BOX_H]); }
else
    _render();
